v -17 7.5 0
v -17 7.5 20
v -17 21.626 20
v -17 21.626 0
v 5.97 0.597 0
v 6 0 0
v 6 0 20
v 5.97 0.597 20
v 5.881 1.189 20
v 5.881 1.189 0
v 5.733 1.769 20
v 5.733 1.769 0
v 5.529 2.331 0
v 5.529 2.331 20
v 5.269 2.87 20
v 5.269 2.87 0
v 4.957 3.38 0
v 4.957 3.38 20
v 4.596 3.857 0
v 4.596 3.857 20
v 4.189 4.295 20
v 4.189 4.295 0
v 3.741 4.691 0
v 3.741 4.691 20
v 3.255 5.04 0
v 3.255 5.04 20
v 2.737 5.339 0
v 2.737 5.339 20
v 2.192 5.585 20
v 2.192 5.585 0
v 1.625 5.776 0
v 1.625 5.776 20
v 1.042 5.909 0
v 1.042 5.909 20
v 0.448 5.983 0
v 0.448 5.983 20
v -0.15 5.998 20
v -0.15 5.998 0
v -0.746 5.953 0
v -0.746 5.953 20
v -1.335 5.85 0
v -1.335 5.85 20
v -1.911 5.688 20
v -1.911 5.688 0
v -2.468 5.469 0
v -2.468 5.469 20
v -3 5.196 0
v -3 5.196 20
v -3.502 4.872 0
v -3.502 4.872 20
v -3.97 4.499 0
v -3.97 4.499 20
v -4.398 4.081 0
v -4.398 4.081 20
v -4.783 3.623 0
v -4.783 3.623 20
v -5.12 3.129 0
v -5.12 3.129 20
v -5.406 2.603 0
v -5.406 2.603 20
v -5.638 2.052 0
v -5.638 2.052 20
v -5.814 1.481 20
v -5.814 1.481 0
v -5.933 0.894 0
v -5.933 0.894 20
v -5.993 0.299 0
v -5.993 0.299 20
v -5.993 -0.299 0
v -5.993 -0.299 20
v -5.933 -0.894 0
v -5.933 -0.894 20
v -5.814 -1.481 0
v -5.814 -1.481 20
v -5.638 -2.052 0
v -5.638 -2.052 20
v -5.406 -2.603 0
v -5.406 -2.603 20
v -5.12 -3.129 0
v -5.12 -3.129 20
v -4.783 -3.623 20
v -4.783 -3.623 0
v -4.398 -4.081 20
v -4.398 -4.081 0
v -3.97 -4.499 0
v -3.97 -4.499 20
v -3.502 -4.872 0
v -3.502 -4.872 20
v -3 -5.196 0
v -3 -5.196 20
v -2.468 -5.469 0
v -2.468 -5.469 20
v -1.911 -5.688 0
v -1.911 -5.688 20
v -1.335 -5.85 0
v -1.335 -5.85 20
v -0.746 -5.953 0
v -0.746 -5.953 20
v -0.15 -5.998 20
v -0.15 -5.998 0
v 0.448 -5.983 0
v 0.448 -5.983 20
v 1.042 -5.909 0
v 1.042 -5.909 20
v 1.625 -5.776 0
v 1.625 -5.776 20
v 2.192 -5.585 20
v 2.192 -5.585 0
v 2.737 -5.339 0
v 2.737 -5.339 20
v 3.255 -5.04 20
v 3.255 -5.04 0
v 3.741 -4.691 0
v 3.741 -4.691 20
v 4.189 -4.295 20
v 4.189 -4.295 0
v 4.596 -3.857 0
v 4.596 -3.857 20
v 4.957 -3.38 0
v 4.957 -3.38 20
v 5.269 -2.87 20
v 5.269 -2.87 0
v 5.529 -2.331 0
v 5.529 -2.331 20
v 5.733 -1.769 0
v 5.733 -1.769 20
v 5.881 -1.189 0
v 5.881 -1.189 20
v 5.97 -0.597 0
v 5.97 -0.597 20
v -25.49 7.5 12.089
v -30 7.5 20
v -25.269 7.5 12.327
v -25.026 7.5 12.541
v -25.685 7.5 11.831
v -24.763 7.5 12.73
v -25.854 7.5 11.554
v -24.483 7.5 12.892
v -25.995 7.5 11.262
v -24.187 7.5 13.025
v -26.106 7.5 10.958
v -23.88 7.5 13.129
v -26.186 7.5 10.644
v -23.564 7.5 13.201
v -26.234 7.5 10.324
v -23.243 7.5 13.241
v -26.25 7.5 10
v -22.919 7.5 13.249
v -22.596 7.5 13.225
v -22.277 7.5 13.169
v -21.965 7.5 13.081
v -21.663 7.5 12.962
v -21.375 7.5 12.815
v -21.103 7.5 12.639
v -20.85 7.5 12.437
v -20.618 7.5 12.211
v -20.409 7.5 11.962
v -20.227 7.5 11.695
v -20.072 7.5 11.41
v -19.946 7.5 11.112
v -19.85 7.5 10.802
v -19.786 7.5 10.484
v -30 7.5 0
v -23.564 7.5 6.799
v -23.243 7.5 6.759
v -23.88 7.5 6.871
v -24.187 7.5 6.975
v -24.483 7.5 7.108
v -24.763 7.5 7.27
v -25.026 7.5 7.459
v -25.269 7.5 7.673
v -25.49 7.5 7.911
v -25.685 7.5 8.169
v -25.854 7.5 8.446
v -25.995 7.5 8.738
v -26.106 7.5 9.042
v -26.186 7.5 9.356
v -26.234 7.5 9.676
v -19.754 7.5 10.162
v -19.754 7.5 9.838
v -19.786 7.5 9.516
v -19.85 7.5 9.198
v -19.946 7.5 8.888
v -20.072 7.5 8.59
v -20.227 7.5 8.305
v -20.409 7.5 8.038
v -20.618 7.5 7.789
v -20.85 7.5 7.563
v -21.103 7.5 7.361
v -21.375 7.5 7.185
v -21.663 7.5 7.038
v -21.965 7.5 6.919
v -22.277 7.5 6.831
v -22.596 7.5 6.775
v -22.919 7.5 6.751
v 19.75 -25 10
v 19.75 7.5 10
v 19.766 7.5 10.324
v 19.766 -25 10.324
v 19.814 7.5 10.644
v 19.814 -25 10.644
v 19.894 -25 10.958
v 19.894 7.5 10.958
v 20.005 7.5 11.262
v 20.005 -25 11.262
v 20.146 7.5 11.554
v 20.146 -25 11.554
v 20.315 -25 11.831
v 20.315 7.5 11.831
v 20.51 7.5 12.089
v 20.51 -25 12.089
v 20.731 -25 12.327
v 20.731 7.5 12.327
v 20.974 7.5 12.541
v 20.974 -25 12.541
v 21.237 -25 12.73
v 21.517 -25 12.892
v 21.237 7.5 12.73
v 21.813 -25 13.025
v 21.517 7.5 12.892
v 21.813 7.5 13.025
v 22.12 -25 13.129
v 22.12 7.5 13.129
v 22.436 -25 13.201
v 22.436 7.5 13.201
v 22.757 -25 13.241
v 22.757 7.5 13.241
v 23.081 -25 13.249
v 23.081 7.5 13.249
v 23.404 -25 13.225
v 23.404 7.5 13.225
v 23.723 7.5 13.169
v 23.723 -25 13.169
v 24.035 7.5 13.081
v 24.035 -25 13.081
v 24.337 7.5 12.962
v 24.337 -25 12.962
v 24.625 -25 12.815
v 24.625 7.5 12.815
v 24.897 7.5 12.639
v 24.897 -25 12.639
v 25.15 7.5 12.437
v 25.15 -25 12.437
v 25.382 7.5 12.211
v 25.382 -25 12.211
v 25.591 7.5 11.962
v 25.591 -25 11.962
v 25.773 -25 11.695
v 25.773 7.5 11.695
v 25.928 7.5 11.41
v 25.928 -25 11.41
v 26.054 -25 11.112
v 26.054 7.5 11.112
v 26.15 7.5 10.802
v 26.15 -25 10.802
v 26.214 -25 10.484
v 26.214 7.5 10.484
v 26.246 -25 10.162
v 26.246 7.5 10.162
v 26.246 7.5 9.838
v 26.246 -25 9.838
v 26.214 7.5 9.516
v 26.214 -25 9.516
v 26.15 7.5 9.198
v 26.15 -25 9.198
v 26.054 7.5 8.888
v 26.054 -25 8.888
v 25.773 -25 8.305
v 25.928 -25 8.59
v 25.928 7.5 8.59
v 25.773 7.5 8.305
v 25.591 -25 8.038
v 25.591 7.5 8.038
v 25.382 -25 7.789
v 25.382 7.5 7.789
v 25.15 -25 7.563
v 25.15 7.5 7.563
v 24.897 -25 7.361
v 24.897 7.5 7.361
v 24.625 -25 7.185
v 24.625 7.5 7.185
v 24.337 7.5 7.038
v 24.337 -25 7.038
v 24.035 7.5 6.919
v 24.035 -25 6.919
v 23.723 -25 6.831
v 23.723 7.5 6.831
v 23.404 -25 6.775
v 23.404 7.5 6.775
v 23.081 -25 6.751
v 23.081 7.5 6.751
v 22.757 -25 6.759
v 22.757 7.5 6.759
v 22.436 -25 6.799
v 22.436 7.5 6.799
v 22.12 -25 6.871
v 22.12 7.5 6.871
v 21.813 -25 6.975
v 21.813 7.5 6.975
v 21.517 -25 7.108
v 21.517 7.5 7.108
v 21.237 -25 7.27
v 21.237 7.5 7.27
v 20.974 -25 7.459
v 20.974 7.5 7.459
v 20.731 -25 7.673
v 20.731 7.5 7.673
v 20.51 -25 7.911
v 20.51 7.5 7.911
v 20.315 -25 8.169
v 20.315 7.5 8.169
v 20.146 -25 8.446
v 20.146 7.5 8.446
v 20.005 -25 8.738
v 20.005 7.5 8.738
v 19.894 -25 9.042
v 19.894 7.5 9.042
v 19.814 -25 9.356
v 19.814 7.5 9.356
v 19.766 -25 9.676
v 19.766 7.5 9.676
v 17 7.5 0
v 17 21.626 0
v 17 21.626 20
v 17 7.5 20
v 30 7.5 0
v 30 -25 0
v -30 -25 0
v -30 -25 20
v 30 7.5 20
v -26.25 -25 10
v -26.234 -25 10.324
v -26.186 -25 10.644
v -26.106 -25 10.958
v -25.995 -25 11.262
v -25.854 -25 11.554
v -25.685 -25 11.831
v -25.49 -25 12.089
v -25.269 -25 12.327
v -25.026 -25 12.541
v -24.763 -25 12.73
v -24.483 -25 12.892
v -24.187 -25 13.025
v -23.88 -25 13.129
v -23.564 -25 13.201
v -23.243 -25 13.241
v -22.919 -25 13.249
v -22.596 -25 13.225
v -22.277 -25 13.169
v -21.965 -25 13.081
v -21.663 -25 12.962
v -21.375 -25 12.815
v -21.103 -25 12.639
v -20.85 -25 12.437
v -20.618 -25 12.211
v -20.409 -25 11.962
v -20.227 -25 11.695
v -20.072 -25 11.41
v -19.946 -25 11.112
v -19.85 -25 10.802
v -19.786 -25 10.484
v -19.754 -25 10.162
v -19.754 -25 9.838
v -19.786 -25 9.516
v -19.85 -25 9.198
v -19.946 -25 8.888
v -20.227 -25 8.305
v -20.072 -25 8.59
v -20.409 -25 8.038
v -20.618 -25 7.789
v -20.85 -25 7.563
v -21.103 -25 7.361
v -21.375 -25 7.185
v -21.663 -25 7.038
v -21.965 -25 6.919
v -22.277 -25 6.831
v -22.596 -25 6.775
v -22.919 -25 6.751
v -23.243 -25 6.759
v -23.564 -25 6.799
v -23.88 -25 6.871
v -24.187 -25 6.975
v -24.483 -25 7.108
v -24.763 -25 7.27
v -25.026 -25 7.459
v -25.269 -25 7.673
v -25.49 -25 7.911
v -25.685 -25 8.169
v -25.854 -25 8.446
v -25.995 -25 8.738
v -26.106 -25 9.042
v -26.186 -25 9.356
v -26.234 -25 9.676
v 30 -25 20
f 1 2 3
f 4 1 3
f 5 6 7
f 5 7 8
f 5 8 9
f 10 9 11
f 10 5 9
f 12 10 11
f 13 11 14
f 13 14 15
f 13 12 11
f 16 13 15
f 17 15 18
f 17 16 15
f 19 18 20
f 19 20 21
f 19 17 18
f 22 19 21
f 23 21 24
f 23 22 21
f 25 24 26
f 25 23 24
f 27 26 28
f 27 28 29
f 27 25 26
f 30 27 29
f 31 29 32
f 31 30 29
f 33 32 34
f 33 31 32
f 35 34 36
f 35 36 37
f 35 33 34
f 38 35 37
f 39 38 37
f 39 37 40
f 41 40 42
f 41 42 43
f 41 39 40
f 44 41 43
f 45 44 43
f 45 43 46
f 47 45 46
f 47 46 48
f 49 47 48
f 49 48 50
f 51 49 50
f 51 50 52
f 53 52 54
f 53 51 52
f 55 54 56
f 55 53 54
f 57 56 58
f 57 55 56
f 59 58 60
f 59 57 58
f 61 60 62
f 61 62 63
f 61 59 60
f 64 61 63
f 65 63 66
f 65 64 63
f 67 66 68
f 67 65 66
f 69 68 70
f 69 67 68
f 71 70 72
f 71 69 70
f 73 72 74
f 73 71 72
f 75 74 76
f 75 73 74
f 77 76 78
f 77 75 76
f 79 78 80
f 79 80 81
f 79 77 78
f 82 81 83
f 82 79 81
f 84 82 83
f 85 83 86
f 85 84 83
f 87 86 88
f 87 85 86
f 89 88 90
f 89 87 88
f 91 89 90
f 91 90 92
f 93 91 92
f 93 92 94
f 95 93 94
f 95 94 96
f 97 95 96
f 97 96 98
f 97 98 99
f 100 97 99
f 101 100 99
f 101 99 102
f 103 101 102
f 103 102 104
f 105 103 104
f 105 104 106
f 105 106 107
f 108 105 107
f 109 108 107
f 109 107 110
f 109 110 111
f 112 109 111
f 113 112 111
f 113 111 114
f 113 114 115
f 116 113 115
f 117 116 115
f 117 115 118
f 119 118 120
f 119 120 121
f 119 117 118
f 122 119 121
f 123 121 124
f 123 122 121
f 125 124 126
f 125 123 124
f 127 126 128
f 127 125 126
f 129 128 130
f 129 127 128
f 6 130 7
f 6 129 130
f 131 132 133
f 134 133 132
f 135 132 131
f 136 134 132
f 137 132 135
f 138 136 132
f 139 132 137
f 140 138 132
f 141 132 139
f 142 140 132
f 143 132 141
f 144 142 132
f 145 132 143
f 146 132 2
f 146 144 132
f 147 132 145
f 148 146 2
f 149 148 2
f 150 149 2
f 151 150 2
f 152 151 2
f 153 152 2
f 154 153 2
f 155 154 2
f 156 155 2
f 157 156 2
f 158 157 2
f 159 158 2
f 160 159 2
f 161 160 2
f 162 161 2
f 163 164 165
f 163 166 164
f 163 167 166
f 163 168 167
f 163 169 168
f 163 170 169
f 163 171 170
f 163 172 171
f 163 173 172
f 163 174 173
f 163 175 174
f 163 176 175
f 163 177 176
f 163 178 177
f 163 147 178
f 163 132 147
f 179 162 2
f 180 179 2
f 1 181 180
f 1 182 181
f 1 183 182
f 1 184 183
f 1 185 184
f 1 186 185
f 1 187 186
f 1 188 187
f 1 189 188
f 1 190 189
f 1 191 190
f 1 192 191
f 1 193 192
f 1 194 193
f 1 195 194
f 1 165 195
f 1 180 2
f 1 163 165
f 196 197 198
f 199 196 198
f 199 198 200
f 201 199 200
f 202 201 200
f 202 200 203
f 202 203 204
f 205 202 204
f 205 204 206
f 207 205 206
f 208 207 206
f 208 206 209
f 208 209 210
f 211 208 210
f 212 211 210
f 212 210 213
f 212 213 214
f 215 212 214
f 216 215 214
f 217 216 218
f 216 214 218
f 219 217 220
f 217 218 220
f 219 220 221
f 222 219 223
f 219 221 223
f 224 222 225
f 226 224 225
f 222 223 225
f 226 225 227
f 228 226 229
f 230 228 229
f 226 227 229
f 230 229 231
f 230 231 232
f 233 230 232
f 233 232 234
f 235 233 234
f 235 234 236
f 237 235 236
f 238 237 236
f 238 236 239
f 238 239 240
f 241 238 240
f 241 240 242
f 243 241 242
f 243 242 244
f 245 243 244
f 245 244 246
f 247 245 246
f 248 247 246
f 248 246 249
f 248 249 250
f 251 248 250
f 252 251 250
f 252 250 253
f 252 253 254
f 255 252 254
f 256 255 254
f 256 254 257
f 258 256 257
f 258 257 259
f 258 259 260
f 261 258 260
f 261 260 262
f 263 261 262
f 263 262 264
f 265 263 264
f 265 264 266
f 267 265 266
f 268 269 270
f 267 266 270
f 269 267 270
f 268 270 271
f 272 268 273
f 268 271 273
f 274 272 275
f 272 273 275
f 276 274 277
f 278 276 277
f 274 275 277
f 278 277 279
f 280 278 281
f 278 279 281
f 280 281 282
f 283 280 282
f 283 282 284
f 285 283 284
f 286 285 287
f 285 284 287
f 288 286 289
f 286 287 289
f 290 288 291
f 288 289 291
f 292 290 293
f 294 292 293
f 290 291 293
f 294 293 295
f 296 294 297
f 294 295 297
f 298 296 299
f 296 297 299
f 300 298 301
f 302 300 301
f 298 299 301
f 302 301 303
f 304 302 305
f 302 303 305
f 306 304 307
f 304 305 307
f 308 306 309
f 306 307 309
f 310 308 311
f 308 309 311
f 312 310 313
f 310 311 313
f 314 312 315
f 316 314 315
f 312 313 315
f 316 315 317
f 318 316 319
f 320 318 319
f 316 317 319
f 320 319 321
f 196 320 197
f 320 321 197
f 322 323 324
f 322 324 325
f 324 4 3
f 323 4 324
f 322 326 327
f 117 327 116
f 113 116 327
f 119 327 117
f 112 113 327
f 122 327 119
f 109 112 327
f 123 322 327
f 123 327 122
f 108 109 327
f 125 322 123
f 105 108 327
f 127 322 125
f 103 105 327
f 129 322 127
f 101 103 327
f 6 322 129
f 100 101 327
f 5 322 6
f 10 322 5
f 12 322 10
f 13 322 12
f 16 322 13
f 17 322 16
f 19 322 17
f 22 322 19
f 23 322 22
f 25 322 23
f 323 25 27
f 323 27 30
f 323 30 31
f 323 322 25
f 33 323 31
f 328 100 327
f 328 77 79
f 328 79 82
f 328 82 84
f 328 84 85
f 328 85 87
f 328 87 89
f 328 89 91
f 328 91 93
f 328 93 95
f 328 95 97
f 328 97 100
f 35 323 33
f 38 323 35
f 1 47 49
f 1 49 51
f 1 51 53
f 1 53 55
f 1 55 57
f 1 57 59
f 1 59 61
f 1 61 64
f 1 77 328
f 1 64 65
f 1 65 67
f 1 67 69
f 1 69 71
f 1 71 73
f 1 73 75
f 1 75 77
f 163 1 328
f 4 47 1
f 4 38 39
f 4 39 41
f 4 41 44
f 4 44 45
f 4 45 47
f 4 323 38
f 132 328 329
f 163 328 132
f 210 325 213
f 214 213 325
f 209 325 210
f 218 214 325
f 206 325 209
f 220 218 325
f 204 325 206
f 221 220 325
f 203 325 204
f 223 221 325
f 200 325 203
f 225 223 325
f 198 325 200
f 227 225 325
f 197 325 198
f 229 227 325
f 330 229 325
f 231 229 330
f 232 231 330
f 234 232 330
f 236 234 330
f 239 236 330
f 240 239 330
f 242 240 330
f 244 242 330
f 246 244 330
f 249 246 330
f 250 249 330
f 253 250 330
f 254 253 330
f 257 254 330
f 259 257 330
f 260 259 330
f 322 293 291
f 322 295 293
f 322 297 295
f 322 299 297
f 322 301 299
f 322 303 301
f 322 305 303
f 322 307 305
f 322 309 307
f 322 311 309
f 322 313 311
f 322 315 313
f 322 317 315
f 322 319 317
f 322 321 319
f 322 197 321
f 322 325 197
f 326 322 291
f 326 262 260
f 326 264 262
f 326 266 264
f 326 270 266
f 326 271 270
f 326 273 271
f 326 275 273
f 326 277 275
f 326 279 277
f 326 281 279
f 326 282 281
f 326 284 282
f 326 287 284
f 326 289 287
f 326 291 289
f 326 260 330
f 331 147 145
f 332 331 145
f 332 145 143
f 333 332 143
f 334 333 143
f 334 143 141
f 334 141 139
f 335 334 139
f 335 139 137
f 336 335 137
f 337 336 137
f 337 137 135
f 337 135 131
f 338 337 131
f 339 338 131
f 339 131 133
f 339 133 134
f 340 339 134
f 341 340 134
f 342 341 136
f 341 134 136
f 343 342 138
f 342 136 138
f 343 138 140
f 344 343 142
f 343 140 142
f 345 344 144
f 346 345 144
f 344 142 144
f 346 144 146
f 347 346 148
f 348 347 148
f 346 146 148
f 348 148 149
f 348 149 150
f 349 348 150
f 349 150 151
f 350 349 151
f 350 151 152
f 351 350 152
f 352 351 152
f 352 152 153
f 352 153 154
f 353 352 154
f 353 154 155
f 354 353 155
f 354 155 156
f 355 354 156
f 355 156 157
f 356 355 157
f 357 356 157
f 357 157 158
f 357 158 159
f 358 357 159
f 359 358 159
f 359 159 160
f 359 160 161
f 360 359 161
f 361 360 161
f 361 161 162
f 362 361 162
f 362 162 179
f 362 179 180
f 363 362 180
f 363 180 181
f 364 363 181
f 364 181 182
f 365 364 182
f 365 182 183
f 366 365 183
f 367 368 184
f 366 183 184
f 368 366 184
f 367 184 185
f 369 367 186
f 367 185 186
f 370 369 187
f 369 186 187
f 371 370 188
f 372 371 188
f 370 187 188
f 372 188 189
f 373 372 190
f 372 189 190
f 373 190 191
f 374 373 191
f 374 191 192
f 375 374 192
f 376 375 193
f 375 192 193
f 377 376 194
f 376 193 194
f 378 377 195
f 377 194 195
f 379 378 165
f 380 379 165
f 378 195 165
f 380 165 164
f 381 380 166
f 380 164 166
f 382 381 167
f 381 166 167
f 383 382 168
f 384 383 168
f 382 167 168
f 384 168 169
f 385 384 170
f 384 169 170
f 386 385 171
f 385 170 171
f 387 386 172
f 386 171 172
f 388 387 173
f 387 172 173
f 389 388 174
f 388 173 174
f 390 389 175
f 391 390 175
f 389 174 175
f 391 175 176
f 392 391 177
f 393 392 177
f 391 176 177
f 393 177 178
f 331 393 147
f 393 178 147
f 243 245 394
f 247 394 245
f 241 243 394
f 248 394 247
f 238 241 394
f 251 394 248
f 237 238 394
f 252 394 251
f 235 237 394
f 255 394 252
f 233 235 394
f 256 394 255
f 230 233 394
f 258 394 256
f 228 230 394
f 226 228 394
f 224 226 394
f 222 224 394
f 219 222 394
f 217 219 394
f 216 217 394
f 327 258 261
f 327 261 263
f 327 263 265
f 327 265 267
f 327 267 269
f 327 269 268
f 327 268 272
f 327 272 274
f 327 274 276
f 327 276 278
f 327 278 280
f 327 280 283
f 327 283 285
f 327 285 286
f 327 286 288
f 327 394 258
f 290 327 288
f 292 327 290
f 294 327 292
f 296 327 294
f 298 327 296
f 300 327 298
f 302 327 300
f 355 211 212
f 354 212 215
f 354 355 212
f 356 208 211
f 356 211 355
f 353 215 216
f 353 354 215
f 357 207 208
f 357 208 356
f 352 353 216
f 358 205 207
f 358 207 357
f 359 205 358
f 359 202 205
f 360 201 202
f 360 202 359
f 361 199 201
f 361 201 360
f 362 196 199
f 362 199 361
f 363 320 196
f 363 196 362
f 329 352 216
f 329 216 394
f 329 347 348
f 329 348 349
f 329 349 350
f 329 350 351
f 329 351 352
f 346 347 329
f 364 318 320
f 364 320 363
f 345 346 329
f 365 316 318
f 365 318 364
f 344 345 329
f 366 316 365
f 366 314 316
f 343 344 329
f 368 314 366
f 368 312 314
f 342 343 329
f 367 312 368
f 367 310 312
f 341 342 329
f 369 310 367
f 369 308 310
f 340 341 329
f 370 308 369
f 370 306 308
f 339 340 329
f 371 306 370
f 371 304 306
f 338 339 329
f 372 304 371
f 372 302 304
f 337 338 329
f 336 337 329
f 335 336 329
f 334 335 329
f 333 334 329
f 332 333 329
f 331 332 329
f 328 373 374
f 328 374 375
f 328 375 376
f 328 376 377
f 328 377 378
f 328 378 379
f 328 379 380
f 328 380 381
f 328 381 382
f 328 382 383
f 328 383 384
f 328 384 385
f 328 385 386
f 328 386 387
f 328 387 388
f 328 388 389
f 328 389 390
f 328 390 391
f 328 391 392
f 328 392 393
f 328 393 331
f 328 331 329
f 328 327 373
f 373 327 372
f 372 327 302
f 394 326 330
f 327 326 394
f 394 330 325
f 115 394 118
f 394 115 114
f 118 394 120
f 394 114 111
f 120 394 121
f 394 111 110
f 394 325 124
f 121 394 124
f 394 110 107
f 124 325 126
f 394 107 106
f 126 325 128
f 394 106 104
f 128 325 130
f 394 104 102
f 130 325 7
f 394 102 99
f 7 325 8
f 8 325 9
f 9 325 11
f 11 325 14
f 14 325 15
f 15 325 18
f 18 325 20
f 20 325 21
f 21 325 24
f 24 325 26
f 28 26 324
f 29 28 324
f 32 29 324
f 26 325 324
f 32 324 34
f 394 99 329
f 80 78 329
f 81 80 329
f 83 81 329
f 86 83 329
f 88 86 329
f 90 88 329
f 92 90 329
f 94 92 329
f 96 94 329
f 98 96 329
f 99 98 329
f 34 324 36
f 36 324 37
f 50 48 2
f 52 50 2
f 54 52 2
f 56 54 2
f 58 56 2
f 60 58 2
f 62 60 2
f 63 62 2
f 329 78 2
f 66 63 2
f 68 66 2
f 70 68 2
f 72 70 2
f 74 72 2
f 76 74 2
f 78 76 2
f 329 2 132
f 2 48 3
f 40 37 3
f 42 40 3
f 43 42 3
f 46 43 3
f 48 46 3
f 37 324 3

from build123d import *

# Parameters (mm, degrees)
SKETCH_R     = 6
PAD_DEPTH    = 20
SKETCH001_R  = 3.25
POCKET_DEPTH = 32.501


with BuildPart() as part:
    # Sketch → Pad (new body)
    with BuildSketch(Plane.XY):
        Polygon((-17, 21.625642), (17, 21.625642), (17, 7.5), (30, 7.5), (30, -25), (-30, -25), (-30, 7.5), (-17, 7.5), align=None)
        Circle(SKETCH_R, mode=Mode.SUBTRACT)
    extrude(amount=PAD_DEPTH)

    # Sketch001 (on Face7 of Pad) → Pocket (cut, through all)
    with BuildSketch(Plane(origin=(0, 7.5, 0), x_dir=(-1, 0, 0), z_dir=(0, 1, 0))):
        with Locations((-23, 10)):
            Circle(SKETCH001_R)
        with Locations((23, 10)):
            Circle(SKETCH001_R)
    extrude(amount=-POCKET_DEPTH, mode=Mode.SUBTRACT)


solid = part.part
